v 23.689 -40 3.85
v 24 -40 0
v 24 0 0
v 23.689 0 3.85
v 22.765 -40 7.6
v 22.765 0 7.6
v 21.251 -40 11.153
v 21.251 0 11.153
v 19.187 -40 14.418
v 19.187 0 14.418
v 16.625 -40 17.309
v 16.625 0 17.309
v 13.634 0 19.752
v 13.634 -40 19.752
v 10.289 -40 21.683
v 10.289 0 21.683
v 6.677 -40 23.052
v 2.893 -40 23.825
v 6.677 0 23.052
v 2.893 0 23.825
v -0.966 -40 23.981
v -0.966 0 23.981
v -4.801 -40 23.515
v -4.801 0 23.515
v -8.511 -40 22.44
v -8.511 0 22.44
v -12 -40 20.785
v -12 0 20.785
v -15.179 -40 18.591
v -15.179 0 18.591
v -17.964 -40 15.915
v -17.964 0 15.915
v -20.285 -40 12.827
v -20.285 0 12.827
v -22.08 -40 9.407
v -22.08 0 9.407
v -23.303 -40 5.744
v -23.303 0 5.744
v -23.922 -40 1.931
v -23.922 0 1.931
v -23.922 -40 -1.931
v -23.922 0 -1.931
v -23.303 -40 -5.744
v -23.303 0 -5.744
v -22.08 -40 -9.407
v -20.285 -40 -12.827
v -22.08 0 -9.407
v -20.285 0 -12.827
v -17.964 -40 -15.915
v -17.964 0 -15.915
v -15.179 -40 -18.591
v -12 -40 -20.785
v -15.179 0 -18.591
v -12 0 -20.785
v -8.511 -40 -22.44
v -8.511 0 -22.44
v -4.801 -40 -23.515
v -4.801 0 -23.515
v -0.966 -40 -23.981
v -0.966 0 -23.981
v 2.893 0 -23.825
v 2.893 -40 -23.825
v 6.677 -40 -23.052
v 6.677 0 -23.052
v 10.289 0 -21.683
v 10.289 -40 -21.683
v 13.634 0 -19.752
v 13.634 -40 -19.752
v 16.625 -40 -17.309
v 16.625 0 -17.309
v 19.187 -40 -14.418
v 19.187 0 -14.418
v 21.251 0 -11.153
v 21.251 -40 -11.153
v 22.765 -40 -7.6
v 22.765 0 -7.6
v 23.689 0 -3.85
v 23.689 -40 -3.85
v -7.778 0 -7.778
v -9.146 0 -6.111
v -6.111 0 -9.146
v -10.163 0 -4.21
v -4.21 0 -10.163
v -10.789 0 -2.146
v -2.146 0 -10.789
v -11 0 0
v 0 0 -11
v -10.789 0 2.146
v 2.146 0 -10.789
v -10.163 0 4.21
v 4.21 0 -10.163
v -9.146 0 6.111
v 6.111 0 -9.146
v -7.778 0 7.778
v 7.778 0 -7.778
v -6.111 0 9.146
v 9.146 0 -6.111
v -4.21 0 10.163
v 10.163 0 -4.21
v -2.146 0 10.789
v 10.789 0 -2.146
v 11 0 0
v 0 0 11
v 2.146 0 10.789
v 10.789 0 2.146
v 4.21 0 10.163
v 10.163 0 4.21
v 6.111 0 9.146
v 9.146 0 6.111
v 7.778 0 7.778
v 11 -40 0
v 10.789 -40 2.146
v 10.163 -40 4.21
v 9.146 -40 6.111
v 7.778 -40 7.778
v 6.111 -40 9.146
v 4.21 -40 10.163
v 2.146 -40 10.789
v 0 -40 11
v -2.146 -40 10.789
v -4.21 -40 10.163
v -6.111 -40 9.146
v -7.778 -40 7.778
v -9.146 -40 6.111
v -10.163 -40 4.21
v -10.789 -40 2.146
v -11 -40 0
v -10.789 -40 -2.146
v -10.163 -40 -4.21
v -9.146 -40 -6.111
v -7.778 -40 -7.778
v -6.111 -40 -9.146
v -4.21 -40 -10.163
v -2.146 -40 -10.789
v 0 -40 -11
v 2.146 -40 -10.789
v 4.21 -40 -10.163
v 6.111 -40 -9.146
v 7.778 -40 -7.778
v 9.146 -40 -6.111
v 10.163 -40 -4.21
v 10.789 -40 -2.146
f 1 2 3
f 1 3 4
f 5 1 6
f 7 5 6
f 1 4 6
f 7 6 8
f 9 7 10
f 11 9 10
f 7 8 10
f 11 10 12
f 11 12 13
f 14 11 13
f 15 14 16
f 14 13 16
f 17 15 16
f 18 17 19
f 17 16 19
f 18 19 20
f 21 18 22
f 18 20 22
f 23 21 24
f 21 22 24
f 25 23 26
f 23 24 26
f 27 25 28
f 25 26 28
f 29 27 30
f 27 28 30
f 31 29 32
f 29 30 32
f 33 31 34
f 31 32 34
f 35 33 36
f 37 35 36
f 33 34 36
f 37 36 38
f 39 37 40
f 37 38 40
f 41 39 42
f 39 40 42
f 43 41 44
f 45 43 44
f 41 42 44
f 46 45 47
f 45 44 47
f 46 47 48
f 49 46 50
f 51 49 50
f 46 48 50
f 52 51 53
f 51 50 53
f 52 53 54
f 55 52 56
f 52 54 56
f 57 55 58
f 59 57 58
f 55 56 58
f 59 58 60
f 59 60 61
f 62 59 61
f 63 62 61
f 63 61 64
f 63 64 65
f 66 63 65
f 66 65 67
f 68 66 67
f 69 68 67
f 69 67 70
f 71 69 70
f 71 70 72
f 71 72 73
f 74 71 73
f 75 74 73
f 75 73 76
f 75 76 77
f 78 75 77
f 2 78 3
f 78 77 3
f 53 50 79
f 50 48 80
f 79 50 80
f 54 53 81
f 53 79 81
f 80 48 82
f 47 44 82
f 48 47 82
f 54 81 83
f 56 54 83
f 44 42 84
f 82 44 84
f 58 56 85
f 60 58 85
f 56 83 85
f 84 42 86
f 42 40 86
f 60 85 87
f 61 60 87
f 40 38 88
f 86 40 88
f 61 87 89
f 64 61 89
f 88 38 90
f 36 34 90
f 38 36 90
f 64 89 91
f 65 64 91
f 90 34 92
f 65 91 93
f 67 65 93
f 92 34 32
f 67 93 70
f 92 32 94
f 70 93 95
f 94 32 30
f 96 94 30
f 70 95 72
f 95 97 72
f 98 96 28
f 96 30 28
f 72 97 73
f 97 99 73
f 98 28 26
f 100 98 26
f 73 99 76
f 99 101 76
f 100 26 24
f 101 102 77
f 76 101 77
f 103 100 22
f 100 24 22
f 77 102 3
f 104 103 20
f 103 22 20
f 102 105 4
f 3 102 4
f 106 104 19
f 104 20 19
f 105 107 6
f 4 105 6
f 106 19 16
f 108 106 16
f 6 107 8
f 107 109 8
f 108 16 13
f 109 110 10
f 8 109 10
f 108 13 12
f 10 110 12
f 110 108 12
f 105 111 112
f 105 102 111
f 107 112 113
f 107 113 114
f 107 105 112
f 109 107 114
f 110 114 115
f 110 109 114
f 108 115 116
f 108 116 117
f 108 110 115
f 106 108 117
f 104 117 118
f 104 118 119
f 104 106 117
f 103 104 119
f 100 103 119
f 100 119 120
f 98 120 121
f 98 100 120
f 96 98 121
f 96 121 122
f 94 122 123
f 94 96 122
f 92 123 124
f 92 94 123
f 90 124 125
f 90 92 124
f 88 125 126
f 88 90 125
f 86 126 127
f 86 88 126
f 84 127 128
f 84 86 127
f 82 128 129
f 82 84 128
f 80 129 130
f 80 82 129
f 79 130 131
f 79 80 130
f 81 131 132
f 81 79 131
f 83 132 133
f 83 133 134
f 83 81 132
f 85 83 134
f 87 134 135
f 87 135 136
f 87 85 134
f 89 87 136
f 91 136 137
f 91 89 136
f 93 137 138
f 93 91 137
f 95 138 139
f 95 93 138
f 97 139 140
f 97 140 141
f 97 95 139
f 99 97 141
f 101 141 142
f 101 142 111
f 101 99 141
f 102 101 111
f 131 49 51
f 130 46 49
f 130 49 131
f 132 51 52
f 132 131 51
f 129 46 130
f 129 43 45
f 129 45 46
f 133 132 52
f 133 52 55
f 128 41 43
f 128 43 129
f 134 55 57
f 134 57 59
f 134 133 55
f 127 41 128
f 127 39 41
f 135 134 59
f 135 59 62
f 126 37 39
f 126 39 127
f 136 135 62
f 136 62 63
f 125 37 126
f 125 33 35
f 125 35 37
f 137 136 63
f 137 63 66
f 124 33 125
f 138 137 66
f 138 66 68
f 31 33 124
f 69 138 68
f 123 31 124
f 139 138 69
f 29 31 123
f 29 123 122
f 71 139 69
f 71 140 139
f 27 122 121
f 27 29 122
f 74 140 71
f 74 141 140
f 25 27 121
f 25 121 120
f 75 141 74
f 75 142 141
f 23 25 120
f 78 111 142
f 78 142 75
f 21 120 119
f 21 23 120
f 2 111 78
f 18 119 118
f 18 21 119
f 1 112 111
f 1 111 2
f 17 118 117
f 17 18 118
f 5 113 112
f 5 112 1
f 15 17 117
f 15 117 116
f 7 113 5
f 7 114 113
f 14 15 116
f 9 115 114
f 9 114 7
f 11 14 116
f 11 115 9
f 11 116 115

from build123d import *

# Parameters (mm, degrees)
F0_R     = 24
F0_R_2   = 11
F1_DEPTH = 12
F2_R     = 24
F2_R_2   = 11
F3_DEPTH = 16
F4_R     = 24
F4_R_2   = 11
F5_DEPTH = 12


with BuildPart() as f1:
    # F0 (on Front) → F1 (new body)
    with BuildSketch(Plane.XZ):
        Circle(F0_R)
        Circle(F0_R_2, mode=Mode.SUBTRACT)
    extrude(amount=F1_DEPTH)

    # F2 (on face) → F3 (join)
    with BuildSketch(Plane.XZ.offset(12)):
        Circle(F2_R)
        Circle(F2_R_2, mode=Mode.SUBTRACT)
    extrude(amount=F3_DEPTH)

    # F4 (on face) → F5 (join)
    with BuildSketch(Plane.XZ.offset(28)):
        Circle(F4_R)
        Circle(F4_R_2, mode=Mode.SUBTRACT)
    extrude(amount=F5_DEPTH)


solid = f1.part
